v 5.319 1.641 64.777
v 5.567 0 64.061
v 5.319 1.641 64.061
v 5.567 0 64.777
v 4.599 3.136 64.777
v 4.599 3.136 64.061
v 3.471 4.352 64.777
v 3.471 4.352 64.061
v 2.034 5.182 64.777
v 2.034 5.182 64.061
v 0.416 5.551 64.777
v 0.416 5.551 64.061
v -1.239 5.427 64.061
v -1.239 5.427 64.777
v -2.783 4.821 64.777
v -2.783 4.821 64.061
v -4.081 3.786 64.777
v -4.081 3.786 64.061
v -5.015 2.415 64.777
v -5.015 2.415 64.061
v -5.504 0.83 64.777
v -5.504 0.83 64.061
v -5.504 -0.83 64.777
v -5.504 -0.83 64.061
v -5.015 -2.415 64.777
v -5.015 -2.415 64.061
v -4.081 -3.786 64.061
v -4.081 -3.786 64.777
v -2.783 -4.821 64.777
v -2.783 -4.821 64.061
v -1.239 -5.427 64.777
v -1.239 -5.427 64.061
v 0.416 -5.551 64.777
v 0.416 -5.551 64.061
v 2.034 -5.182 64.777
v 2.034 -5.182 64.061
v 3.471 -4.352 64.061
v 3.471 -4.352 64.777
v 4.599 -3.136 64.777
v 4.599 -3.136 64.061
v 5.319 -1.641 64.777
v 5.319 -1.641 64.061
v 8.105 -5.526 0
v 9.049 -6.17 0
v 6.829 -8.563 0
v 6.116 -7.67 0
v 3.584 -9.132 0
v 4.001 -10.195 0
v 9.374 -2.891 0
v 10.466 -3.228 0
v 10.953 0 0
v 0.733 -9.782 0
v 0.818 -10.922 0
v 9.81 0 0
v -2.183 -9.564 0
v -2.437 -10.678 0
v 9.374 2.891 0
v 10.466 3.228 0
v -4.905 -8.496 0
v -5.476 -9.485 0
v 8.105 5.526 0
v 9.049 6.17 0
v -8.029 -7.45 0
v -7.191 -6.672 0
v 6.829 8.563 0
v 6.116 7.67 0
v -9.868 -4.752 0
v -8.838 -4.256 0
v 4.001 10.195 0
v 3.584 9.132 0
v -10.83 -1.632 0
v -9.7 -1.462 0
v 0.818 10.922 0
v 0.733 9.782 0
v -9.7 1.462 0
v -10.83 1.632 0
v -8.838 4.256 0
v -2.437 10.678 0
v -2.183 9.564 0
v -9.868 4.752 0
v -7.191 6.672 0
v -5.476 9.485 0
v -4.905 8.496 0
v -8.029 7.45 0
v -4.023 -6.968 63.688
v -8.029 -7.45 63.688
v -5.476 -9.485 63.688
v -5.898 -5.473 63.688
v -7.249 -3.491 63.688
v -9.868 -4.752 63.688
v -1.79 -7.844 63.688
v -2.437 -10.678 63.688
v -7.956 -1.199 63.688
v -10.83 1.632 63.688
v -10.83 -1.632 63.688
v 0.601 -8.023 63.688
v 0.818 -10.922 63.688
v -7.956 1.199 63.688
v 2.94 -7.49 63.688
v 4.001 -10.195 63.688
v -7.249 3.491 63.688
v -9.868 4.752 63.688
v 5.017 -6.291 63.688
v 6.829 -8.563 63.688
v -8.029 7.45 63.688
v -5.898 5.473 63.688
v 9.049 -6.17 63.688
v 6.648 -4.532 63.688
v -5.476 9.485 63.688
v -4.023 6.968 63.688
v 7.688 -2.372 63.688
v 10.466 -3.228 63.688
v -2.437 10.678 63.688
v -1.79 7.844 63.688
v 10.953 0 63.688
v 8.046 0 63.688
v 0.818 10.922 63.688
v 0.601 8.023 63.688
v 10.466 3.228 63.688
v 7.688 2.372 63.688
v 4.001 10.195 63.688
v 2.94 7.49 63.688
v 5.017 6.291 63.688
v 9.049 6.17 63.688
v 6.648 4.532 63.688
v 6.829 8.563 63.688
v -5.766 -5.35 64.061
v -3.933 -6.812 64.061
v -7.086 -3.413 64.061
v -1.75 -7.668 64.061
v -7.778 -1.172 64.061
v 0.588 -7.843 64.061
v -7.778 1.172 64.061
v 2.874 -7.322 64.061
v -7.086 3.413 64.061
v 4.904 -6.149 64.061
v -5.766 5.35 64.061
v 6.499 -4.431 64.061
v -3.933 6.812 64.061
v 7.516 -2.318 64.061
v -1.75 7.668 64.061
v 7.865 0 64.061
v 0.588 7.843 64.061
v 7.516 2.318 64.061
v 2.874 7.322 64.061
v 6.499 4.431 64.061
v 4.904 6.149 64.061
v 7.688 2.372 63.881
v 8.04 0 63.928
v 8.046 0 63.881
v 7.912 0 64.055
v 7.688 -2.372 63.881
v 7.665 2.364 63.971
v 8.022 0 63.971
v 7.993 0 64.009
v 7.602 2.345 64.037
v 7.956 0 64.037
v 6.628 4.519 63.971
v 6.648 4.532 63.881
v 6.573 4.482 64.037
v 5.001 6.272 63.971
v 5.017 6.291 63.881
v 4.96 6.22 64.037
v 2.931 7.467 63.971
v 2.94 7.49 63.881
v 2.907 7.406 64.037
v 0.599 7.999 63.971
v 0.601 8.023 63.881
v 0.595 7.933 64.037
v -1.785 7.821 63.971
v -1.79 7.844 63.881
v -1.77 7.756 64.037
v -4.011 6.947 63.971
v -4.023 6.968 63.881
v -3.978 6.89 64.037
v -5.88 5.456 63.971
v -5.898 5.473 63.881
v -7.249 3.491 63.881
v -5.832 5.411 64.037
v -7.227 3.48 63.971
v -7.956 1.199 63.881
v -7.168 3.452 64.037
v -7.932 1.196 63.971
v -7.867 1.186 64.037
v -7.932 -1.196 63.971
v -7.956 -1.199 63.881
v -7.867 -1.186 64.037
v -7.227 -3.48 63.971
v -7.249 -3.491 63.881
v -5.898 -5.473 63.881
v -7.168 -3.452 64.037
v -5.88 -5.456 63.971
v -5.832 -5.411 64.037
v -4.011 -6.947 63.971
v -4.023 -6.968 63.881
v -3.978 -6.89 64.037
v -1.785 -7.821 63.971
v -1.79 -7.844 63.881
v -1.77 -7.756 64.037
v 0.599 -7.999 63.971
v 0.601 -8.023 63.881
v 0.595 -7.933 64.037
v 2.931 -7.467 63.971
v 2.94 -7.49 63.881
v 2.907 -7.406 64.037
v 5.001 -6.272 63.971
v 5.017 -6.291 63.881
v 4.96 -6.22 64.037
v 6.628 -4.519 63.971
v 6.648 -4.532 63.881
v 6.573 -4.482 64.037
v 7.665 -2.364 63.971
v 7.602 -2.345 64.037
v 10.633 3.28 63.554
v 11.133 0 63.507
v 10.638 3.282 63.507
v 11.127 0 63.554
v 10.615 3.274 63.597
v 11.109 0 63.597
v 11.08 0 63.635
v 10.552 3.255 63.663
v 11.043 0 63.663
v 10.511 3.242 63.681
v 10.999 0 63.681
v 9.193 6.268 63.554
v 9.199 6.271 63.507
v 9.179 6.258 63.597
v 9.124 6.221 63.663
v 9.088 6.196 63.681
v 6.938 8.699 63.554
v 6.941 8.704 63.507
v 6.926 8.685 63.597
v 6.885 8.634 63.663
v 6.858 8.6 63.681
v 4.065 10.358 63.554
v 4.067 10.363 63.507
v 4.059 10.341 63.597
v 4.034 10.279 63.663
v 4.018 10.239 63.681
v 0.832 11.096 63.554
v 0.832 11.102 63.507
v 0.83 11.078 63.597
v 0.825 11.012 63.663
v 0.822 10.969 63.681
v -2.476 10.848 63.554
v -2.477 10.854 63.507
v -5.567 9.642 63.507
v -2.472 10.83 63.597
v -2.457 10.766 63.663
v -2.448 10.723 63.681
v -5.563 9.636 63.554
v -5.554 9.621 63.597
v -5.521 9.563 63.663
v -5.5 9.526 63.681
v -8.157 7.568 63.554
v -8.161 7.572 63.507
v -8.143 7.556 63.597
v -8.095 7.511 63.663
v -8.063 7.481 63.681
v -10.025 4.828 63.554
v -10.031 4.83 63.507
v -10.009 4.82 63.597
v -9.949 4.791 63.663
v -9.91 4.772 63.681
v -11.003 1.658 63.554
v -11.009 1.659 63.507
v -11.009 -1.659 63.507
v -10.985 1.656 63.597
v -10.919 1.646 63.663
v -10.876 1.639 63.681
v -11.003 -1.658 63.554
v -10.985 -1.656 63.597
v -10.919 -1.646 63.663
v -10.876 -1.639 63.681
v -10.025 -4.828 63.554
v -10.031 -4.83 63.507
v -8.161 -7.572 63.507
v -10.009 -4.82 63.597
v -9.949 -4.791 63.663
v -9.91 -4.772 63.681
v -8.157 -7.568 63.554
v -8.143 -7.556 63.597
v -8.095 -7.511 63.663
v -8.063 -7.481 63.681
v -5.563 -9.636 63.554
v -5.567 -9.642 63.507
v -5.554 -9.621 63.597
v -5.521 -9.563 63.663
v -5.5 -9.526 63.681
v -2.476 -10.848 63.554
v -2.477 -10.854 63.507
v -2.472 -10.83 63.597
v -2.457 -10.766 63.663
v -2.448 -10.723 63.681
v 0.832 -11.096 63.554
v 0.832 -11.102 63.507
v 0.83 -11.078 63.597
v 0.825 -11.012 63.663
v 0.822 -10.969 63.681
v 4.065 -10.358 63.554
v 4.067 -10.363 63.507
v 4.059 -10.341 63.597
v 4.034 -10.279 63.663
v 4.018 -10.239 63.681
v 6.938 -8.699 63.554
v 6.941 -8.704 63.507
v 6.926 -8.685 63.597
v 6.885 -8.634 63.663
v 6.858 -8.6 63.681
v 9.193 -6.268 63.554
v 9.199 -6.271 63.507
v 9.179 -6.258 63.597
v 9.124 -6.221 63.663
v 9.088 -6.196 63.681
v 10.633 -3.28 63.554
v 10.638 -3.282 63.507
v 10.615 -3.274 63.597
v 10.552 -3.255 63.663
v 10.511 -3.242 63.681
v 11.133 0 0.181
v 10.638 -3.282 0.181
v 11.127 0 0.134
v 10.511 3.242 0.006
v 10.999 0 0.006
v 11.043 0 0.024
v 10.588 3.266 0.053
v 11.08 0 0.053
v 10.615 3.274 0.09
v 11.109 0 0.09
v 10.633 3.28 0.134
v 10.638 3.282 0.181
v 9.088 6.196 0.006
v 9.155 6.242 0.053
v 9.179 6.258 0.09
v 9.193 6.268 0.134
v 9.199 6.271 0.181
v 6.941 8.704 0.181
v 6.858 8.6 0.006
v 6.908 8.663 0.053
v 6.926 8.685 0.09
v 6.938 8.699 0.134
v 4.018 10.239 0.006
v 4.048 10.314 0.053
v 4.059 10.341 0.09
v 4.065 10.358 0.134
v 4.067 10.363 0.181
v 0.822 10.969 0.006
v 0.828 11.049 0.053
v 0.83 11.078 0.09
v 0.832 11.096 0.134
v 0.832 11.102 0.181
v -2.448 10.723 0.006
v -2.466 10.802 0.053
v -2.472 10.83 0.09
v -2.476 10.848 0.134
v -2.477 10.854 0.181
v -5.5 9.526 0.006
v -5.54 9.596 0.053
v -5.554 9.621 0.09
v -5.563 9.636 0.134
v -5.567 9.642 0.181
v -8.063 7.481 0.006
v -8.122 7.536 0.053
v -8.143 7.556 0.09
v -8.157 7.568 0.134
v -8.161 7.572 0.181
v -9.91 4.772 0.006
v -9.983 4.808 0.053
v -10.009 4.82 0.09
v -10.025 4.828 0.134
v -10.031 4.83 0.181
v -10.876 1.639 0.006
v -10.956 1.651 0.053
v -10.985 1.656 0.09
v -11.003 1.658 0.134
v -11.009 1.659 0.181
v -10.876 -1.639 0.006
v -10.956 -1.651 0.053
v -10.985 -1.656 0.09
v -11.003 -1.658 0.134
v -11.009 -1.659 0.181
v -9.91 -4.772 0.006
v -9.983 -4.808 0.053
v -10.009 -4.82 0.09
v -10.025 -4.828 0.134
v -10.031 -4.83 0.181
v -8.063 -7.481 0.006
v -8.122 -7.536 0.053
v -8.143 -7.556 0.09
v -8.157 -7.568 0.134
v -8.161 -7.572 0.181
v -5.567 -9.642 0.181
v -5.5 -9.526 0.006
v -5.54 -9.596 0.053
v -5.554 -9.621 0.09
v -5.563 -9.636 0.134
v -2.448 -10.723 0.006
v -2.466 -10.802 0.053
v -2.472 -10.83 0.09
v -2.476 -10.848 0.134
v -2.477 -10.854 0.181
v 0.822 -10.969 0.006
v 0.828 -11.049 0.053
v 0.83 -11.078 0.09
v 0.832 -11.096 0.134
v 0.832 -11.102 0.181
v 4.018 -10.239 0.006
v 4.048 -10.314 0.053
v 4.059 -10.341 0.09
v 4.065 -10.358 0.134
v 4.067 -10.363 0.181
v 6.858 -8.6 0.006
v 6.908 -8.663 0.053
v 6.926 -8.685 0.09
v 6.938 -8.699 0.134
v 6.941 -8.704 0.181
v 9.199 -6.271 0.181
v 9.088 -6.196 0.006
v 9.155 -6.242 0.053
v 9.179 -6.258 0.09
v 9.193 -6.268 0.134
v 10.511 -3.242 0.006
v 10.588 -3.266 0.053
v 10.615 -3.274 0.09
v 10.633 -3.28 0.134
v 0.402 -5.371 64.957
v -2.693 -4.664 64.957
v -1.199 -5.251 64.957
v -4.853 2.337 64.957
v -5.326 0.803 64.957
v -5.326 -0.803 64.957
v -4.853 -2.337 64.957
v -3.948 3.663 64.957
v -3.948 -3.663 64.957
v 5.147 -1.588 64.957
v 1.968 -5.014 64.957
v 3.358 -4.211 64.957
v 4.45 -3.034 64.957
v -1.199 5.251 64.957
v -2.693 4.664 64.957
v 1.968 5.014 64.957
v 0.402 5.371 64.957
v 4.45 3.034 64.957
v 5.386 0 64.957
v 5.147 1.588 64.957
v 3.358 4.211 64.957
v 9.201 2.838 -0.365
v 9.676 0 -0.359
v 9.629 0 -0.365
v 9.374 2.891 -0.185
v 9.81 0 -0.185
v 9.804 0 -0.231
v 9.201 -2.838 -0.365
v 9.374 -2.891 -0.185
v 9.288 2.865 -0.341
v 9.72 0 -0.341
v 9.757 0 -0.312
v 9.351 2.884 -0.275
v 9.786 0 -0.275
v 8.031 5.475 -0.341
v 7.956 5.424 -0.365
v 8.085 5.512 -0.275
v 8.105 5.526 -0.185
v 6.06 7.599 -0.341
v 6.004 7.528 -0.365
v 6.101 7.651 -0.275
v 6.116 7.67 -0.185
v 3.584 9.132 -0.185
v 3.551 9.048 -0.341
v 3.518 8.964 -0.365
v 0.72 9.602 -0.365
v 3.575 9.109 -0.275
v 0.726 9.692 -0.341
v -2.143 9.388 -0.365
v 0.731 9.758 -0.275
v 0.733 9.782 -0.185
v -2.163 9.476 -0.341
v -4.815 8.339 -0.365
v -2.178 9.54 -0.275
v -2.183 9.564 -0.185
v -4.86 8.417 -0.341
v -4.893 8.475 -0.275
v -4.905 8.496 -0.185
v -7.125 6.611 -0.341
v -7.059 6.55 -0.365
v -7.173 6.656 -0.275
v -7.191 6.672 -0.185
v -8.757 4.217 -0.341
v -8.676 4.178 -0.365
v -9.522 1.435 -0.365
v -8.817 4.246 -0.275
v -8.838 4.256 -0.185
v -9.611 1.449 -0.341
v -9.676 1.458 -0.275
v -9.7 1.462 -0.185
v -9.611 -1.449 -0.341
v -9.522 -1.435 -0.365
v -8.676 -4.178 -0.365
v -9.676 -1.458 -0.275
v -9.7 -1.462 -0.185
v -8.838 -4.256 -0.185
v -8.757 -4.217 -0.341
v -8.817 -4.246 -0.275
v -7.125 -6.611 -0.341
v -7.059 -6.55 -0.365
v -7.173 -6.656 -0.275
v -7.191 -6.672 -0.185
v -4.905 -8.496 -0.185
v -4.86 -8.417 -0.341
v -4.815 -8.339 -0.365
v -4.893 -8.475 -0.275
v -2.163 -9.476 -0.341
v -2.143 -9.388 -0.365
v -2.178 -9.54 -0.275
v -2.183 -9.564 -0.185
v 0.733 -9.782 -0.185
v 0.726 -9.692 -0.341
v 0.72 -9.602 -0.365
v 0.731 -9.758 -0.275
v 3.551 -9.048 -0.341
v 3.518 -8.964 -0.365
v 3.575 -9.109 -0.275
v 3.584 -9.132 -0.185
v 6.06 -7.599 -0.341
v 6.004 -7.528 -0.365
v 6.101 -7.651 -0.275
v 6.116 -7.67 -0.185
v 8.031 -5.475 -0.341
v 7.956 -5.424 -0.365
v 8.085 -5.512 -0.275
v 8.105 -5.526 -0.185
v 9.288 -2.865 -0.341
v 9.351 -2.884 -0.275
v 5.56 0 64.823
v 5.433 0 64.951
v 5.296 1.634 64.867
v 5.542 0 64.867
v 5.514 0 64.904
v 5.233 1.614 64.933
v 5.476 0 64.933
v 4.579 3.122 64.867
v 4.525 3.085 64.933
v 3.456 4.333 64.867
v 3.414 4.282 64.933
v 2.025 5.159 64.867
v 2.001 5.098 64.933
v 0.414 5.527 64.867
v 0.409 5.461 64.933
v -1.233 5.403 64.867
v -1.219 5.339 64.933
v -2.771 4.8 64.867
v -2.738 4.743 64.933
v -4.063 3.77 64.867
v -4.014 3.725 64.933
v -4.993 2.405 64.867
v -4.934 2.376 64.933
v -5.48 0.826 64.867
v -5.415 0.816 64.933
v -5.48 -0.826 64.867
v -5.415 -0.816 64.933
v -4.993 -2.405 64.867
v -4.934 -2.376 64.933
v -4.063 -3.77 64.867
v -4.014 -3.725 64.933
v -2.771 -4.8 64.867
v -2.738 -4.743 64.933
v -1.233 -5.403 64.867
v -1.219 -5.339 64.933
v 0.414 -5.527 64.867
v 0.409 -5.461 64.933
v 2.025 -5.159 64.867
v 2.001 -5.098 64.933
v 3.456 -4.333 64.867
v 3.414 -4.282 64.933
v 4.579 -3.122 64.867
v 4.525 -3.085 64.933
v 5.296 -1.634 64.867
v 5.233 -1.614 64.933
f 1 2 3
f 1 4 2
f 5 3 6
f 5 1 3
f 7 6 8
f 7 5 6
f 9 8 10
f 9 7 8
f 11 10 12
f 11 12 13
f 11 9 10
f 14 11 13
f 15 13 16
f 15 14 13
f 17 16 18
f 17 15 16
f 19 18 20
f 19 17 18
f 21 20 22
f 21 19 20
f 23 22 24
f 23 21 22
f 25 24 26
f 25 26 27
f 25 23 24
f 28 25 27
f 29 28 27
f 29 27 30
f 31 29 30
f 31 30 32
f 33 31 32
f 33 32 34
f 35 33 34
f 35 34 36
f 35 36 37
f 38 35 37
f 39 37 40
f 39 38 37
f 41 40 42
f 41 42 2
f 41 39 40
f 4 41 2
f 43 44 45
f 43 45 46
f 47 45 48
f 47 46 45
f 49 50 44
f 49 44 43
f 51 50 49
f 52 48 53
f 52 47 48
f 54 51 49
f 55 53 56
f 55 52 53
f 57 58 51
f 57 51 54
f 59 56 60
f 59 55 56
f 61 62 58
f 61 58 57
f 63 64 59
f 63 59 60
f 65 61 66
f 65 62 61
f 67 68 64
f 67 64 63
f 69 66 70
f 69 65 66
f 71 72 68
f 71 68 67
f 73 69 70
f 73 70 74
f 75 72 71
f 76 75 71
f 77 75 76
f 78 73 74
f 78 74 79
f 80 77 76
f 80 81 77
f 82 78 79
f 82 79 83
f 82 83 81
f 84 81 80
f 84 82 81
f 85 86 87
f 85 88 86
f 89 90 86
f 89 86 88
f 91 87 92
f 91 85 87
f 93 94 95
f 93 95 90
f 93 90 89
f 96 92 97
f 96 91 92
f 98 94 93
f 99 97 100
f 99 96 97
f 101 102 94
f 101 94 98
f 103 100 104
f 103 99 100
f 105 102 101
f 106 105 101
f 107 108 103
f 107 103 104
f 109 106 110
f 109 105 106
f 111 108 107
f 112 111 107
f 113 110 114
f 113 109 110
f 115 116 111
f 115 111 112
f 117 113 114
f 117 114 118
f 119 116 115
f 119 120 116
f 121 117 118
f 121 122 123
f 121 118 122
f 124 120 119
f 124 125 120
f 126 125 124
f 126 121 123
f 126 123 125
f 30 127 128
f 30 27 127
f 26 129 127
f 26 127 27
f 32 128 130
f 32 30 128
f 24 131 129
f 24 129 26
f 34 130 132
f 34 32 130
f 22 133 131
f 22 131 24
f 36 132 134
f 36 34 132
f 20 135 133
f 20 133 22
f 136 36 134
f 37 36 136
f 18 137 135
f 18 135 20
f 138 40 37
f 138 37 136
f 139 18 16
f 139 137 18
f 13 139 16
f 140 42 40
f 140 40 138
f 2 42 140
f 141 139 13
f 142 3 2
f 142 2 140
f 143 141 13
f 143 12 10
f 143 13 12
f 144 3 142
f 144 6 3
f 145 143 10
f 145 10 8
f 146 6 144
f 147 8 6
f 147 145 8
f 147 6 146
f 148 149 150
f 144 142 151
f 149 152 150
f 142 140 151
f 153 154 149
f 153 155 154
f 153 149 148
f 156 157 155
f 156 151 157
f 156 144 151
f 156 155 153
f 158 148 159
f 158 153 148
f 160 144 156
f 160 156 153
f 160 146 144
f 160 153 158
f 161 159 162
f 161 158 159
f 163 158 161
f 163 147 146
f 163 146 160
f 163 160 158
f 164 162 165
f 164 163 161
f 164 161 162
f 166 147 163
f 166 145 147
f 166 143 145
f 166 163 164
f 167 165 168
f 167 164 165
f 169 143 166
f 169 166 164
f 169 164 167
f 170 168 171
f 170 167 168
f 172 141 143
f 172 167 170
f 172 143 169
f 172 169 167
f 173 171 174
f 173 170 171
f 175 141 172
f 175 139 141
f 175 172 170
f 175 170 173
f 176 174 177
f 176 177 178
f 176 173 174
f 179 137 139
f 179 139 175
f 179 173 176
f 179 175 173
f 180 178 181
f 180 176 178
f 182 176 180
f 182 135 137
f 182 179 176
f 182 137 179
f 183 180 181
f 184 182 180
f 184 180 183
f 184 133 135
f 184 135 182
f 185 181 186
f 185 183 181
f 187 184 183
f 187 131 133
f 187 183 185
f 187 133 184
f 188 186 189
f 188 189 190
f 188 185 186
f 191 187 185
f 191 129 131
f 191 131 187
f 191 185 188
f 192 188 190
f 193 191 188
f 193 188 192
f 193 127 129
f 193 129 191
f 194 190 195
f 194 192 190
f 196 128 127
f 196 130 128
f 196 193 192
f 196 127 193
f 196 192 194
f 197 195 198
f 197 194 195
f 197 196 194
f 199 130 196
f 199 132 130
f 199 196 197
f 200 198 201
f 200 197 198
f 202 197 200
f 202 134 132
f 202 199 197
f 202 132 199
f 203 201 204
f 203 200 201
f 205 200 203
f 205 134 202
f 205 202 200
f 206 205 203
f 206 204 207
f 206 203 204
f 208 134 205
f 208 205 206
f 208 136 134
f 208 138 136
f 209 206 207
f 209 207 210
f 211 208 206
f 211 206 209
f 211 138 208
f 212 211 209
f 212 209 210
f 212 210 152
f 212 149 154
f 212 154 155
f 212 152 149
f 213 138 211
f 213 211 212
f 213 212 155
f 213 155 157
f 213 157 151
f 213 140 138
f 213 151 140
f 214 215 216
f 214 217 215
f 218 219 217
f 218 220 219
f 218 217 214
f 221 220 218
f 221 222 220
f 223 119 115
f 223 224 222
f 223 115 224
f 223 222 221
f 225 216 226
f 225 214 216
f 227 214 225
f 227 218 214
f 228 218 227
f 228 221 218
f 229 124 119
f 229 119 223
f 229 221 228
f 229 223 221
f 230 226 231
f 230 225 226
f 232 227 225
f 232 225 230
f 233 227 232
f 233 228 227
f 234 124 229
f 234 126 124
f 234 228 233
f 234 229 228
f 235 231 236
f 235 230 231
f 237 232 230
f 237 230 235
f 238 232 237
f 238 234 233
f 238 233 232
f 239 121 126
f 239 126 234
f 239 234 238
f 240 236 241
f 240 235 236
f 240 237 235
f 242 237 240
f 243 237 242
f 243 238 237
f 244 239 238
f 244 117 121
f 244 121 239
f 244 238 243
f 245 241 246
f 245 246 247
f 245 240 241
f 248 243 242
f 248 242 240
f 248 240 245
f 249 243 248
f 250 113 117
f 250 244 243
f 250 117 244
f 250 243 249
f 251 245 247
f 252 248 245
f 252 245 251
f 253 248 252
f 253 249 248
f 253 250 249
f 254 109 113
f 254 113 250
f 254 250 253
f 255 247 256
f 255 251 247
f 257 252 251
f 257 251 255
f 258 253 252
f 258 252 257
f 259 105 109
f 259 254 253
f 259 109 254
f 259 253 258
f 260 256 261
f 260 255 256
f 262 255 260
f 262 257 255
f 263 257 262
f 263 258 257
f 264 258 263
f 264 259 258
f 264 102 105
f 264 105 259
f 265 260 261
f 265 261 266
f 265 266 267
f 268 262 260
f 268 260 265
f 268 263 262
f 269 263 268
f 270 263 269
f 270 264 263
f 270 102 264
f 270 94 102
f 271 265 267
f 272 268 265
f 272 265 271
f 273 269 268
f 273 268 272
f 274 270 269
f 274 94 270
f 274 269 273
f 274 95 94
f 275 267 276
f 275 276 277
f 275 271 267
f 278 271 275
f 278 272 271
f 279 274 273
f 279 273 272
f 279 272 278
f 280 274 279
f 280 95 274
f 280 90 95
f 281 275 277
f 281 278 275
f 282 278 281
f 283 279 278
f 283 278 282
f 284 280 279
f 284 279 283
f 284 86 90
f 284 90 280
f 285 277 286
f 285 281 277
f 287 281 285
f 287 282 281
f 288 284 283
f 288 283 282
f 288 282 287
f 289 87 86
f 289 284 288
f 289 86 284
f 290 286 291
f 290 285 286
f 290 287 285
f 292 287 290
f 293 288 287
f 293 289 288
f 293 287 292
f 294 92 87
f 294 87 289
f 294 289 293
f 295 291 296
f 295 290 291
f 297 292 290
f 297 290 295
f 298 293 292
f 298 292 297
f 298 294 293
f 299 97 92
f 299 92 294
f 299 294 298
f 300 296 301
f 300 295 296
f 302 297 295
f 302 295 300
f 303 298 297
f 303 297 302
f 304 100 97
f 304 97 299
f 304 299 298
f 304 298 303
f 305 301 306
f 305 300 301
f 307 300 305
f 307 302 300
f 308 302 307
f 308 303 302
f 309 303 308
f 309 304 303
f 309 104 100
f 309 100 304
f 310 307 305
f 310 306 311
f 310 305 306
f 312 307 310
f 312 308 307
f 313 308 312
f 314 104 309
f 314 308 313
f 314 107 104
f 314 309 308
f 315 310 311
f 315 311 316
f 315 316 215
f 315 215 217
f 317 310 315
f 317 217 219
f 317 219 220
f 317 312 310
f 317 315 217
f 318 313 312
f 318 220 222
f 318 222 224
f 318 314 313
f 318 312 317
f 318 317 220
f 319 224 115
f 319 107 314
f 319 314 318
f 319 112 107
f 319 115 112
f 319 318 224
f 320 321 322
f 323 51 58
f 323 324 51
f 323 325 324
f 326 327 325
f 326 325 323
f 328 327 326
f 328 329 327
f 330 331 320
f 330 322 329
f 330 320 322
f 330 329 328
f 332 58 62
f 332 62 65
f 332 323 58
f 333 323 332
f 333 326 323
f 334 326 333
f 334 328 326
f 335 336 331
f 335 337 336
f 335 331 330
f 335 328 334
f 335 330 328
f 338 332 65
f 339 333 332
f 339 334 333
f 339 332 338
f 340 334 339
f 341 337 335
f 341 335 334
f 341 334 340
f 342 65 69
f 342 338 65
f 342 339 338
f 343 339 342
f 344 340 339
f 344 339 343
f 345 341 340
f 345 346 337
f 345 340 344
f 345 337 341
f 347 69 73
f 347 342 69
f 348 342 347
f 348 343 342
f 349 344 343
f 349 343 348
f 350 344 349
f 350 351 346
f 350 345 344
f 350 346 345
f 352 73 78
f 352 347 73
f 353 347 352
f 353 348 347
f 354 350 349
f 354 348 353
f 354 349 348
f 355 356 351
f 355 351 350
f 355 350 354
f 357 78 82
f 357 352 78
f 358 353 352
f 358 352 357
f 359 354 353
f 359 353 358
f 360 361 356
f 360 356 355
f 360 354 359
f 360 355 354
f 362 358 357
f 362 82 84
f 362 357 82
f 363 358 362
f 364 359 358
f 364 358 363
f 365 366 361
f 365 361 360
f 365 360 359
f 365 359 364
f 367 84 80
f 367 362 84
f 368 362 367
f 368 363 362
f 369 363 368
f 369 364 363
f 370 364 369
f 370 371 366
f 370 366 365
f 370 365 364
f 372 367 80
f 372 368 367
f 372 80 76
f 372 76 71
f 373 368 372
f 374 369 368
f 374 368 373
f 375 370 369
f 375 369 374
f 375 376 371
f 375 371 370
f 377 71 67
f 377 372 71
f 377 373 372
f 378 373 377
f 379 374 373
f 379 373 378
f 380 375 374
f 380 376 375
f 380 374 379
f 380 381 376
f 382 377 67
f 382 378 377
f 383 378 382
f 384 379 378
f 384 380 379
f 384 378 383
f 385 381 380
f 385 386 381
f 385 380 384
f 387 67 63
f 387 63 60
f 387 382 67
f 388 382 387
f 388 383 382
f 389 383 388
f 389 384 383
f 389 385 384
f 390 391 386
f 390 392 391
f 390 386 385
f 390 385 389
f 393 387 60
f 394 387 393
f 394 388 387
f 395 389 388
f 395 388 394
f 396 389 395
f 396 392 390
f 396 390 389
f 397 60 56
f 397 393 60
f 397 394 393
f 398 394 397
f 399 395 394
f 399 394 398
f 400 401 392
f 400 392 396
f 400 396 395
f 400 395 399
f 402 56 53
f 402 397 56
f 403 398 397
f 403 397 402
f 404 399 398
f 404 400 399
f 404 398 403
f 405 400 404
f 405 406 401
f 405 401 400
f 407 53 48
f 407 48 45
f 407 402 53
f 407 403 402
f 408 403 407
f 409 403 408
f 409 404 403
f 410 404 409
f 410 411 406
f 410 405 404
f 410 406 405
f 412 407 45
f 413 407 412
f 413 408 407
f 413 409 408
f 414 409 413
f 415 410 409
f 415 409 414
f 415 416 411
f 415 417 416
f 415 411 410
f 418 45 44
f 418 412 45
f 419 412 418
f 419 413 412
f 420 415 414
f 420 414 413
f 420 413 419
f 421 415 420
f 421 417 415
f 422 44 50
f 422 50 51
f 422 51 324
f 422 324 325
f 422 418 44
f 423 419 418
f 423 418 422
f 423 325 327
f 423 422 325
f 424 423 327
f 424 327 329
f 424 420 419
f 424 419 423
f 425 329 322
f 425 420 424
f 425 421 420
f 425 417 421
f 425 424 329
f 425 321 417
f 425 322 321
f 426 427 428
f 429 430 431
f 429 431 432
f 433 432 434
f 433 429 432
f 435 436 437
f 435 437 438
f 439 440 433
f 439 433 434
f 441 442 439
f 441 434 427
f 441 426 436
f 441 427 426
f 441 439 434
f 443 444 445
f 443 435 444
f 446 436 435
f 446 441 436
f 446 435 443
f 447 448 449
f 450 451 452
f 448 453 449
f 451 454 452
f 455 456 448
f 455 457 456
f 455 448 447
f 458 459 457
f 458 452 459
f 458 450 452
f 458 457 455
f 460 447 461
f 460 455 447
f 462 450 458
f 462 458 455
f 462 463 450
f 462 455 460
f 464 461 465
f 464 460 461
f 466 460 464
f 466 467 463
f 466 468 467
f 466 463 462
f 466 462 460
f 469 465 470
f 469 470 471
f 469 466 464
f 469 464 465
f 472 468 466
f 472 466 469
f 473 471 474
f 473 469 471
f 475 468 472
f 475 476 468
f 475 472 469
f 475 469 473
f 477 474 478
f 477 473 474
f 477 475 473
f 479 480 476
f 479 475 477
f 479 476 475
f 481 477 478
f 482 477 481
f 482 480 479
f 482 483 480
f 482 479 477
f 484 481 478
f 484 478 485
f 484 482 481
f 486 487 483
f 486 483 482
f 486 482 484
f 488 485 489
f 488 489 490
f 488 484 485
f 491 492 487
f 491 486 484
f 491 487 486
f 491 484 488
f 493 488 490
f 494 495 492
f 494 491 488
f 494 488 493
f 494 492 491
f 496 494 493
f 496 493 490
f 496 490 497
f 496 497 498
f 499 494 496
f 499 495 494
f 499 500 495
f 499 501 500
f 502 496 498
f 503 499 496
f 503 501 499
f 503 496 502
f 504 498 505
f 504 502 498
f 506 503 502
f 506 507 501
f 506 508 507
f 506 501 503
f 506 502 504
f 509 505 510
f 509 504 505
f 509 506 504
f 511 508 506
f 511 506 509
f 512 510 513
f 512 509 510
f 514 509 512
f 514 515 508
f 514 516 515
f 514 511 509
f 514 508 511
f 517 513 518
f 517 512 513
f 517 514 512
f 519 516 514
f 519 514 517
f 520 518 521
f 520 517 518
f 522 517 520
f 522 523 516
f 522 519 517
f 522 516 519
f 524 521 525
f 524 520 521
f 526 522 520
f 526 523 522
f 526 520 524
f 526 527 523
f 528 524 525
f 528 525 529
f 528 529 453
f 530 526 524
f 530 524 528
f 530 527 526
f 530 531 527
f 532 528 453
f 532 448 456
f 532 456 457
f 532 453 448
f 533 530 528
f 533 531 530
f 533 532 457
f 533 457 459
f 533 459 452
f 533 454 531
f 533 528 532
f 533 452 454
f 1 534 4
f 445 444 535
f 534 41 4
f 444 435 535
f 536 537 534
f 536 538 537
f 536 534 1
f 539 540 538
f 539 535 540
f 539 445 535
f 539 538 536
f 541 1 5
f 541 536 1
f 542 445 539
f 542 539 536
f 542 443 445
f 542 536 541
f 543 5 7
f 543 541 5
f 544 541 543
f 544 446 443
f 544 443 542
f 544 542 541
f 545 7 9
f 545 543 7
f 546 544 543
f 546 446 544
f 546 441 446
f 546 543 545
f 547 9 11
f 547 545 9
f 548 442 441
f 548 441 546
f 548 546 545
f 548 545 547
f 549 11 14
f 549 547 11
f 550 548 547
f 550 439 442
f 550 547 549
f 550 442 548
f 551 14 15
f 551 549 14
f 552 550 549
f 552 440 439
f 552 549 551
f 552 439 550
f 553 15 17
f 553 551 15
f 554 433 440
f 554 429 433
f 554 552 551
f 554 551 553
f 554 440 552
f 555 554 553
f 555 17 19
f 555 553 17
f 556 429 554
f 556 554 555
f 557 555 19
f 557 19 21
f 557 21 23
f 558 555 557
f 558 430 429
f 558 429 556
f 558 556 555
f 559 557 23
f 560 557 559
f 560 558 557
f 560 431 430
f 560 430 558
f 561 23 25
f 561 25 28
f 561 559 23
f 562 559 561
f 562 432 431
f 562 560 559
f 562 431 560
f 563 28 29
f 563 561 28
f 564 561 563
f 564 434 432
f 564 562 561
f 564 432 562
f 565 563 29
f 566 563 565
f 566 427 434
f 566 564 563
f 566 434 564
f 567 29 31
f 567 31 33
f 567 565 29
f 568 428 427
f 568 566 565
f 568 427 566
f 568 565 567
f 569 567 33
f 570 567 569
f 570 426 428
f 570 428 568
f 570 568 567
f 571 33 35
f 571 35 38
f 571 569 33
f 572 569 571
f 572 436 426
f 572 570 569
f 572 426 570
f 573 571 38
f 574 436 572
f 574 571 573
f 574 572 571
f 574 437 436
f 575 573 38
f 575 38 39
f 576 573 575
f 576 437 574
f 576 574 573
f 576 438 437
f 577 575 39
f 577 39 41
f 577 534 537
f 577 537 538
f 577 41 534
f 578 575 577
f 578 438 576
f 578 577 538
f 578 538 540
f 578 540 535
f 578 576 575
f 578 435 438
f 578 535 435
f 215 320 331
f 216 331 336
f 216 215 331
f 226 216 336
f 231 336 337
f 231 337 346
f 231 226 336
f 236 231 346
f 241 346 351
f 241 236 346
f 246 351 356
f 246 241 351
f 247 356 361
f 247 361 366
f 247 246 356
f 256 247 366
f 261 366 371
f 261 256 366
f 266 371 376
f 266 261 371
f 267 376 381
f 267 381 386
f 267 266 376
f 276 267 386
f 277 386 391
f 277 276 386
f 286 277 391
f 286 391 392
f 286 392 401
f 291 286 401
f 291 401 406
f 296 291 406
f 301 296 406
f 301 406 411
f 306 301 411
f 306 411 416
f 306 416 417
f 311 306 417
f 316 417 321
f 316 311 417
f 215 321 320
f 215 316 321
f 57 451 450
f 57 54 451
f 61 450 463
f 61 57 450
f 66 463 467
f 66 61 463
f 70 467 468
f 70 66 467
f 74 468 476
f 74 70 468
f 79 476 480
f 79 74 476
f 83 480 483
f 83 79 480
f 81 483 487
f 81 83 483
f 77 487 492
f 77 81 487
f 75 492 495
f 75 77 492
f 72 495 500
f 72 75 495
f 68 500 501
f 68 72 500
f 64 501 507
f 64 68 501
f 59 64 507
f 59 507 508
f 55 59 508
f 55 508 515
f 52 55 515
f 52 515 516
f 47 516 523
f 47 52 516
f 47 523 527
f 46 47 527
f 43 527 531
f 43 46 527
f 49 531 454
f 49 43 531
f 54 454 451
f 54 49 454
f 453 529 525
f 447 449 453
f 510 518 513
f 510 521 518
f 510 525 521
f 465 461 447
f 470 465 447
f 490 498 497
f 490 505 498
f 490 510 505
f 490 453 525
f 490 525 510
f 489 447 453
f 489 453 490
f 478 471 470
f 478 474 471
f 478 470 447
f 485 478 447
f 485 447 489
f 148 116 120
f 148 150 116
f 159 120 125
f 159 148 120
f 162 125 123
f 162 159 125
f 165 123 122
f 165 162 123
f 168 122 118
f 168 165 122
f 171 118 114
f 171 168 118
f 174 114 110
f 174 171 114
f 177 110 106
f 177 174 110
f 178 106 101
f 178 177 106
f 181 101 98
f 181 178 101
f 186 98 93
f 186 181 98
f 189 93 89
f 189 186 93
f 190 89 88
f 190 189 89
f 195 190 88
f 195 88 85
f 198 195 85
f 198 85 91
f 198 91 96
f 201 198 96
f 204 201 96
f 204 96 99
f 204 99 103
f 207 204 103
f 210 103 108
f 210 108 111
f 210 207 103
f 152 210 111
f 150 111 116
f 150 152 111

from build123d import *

# Parameters (mm, degrees)
F0_W = 5.566528
F0_H = 0.37384


with BuildPart() as f1:
    # F0 (on Front) → F1 (revolve)
    with BuildSketch(Plane.XZ):
        with BuildLine():
            Line((0, 64.957067), (0, 64.06147))
            Line((0, 64.06147), (5.566528, 64.06147))
            Line((5.566528, 64.06147), (5.566528, 64.776555))
            ThreePointArc((5.566528, 64.776555), (5.513657, 64.904197), (5.386015, 64.957067))
            Line((5.386015, 64.957067), (0, 64.957067))
        make_face()
        with Locations((2.783264, 63.87455)):
            Rectangle(F0_W, F0_H)
        with BuildLine():
            Line((5.566528, 64.06147), (5.566528, 63.68763))
            Line((5.566528, 63.68763), (8.045916, 63.68763))
            Line((8.045916, 63.68763), (8.045916, 63.880958))
            ThreePointArc((8.045916, 63.880958), (7.993046, 64.008599), (7.865404, 64.06147))
            Line((7.865404, 64.06147), (5.566528, 64.06147))
        make_face()
        with BuildLine():
            Line((0, 63.68763), (0, 0))
            Line((0, 0), (9.809786, 0))
            Line((9.809786, 0), (10.952543, 0))
            ThreePointArc((10.952543, 0), (11.080184, 0.052871), (11.133055, 0.180512))
            Line((11.133055, 0.180512), (11.133055, 63.507118))
            ThreePointArc((11.133055, 63.507118), (11.080184, 63.634759), (10.952543, 63.68763))
            Line((10.952543, 63.68763), (8.045916, 63.68763))
            Line((8.045916, 63.68763), (5.566528, 63.68763))
            Line((5.566528, 63.68763), (0, 63.68763))
        make_face()
        with BuildLine():
            Line((9.809786, 0), (0, 0))
            Line((0, 0), (0, -0.365171))
            Line((0, -0.365171), (9.629273, -0.365171))
            ThreePointArc((9.629273, -0.365171), (9.756915, -0.3123), (9.809786, -0.184658))
            Line((9.809786, -0.184658), (9.809786, 0))
        make_face()
    revolve(axis=Axis((0, 0, 31.843815), (0, 0, 1)))


solid = f1.part
